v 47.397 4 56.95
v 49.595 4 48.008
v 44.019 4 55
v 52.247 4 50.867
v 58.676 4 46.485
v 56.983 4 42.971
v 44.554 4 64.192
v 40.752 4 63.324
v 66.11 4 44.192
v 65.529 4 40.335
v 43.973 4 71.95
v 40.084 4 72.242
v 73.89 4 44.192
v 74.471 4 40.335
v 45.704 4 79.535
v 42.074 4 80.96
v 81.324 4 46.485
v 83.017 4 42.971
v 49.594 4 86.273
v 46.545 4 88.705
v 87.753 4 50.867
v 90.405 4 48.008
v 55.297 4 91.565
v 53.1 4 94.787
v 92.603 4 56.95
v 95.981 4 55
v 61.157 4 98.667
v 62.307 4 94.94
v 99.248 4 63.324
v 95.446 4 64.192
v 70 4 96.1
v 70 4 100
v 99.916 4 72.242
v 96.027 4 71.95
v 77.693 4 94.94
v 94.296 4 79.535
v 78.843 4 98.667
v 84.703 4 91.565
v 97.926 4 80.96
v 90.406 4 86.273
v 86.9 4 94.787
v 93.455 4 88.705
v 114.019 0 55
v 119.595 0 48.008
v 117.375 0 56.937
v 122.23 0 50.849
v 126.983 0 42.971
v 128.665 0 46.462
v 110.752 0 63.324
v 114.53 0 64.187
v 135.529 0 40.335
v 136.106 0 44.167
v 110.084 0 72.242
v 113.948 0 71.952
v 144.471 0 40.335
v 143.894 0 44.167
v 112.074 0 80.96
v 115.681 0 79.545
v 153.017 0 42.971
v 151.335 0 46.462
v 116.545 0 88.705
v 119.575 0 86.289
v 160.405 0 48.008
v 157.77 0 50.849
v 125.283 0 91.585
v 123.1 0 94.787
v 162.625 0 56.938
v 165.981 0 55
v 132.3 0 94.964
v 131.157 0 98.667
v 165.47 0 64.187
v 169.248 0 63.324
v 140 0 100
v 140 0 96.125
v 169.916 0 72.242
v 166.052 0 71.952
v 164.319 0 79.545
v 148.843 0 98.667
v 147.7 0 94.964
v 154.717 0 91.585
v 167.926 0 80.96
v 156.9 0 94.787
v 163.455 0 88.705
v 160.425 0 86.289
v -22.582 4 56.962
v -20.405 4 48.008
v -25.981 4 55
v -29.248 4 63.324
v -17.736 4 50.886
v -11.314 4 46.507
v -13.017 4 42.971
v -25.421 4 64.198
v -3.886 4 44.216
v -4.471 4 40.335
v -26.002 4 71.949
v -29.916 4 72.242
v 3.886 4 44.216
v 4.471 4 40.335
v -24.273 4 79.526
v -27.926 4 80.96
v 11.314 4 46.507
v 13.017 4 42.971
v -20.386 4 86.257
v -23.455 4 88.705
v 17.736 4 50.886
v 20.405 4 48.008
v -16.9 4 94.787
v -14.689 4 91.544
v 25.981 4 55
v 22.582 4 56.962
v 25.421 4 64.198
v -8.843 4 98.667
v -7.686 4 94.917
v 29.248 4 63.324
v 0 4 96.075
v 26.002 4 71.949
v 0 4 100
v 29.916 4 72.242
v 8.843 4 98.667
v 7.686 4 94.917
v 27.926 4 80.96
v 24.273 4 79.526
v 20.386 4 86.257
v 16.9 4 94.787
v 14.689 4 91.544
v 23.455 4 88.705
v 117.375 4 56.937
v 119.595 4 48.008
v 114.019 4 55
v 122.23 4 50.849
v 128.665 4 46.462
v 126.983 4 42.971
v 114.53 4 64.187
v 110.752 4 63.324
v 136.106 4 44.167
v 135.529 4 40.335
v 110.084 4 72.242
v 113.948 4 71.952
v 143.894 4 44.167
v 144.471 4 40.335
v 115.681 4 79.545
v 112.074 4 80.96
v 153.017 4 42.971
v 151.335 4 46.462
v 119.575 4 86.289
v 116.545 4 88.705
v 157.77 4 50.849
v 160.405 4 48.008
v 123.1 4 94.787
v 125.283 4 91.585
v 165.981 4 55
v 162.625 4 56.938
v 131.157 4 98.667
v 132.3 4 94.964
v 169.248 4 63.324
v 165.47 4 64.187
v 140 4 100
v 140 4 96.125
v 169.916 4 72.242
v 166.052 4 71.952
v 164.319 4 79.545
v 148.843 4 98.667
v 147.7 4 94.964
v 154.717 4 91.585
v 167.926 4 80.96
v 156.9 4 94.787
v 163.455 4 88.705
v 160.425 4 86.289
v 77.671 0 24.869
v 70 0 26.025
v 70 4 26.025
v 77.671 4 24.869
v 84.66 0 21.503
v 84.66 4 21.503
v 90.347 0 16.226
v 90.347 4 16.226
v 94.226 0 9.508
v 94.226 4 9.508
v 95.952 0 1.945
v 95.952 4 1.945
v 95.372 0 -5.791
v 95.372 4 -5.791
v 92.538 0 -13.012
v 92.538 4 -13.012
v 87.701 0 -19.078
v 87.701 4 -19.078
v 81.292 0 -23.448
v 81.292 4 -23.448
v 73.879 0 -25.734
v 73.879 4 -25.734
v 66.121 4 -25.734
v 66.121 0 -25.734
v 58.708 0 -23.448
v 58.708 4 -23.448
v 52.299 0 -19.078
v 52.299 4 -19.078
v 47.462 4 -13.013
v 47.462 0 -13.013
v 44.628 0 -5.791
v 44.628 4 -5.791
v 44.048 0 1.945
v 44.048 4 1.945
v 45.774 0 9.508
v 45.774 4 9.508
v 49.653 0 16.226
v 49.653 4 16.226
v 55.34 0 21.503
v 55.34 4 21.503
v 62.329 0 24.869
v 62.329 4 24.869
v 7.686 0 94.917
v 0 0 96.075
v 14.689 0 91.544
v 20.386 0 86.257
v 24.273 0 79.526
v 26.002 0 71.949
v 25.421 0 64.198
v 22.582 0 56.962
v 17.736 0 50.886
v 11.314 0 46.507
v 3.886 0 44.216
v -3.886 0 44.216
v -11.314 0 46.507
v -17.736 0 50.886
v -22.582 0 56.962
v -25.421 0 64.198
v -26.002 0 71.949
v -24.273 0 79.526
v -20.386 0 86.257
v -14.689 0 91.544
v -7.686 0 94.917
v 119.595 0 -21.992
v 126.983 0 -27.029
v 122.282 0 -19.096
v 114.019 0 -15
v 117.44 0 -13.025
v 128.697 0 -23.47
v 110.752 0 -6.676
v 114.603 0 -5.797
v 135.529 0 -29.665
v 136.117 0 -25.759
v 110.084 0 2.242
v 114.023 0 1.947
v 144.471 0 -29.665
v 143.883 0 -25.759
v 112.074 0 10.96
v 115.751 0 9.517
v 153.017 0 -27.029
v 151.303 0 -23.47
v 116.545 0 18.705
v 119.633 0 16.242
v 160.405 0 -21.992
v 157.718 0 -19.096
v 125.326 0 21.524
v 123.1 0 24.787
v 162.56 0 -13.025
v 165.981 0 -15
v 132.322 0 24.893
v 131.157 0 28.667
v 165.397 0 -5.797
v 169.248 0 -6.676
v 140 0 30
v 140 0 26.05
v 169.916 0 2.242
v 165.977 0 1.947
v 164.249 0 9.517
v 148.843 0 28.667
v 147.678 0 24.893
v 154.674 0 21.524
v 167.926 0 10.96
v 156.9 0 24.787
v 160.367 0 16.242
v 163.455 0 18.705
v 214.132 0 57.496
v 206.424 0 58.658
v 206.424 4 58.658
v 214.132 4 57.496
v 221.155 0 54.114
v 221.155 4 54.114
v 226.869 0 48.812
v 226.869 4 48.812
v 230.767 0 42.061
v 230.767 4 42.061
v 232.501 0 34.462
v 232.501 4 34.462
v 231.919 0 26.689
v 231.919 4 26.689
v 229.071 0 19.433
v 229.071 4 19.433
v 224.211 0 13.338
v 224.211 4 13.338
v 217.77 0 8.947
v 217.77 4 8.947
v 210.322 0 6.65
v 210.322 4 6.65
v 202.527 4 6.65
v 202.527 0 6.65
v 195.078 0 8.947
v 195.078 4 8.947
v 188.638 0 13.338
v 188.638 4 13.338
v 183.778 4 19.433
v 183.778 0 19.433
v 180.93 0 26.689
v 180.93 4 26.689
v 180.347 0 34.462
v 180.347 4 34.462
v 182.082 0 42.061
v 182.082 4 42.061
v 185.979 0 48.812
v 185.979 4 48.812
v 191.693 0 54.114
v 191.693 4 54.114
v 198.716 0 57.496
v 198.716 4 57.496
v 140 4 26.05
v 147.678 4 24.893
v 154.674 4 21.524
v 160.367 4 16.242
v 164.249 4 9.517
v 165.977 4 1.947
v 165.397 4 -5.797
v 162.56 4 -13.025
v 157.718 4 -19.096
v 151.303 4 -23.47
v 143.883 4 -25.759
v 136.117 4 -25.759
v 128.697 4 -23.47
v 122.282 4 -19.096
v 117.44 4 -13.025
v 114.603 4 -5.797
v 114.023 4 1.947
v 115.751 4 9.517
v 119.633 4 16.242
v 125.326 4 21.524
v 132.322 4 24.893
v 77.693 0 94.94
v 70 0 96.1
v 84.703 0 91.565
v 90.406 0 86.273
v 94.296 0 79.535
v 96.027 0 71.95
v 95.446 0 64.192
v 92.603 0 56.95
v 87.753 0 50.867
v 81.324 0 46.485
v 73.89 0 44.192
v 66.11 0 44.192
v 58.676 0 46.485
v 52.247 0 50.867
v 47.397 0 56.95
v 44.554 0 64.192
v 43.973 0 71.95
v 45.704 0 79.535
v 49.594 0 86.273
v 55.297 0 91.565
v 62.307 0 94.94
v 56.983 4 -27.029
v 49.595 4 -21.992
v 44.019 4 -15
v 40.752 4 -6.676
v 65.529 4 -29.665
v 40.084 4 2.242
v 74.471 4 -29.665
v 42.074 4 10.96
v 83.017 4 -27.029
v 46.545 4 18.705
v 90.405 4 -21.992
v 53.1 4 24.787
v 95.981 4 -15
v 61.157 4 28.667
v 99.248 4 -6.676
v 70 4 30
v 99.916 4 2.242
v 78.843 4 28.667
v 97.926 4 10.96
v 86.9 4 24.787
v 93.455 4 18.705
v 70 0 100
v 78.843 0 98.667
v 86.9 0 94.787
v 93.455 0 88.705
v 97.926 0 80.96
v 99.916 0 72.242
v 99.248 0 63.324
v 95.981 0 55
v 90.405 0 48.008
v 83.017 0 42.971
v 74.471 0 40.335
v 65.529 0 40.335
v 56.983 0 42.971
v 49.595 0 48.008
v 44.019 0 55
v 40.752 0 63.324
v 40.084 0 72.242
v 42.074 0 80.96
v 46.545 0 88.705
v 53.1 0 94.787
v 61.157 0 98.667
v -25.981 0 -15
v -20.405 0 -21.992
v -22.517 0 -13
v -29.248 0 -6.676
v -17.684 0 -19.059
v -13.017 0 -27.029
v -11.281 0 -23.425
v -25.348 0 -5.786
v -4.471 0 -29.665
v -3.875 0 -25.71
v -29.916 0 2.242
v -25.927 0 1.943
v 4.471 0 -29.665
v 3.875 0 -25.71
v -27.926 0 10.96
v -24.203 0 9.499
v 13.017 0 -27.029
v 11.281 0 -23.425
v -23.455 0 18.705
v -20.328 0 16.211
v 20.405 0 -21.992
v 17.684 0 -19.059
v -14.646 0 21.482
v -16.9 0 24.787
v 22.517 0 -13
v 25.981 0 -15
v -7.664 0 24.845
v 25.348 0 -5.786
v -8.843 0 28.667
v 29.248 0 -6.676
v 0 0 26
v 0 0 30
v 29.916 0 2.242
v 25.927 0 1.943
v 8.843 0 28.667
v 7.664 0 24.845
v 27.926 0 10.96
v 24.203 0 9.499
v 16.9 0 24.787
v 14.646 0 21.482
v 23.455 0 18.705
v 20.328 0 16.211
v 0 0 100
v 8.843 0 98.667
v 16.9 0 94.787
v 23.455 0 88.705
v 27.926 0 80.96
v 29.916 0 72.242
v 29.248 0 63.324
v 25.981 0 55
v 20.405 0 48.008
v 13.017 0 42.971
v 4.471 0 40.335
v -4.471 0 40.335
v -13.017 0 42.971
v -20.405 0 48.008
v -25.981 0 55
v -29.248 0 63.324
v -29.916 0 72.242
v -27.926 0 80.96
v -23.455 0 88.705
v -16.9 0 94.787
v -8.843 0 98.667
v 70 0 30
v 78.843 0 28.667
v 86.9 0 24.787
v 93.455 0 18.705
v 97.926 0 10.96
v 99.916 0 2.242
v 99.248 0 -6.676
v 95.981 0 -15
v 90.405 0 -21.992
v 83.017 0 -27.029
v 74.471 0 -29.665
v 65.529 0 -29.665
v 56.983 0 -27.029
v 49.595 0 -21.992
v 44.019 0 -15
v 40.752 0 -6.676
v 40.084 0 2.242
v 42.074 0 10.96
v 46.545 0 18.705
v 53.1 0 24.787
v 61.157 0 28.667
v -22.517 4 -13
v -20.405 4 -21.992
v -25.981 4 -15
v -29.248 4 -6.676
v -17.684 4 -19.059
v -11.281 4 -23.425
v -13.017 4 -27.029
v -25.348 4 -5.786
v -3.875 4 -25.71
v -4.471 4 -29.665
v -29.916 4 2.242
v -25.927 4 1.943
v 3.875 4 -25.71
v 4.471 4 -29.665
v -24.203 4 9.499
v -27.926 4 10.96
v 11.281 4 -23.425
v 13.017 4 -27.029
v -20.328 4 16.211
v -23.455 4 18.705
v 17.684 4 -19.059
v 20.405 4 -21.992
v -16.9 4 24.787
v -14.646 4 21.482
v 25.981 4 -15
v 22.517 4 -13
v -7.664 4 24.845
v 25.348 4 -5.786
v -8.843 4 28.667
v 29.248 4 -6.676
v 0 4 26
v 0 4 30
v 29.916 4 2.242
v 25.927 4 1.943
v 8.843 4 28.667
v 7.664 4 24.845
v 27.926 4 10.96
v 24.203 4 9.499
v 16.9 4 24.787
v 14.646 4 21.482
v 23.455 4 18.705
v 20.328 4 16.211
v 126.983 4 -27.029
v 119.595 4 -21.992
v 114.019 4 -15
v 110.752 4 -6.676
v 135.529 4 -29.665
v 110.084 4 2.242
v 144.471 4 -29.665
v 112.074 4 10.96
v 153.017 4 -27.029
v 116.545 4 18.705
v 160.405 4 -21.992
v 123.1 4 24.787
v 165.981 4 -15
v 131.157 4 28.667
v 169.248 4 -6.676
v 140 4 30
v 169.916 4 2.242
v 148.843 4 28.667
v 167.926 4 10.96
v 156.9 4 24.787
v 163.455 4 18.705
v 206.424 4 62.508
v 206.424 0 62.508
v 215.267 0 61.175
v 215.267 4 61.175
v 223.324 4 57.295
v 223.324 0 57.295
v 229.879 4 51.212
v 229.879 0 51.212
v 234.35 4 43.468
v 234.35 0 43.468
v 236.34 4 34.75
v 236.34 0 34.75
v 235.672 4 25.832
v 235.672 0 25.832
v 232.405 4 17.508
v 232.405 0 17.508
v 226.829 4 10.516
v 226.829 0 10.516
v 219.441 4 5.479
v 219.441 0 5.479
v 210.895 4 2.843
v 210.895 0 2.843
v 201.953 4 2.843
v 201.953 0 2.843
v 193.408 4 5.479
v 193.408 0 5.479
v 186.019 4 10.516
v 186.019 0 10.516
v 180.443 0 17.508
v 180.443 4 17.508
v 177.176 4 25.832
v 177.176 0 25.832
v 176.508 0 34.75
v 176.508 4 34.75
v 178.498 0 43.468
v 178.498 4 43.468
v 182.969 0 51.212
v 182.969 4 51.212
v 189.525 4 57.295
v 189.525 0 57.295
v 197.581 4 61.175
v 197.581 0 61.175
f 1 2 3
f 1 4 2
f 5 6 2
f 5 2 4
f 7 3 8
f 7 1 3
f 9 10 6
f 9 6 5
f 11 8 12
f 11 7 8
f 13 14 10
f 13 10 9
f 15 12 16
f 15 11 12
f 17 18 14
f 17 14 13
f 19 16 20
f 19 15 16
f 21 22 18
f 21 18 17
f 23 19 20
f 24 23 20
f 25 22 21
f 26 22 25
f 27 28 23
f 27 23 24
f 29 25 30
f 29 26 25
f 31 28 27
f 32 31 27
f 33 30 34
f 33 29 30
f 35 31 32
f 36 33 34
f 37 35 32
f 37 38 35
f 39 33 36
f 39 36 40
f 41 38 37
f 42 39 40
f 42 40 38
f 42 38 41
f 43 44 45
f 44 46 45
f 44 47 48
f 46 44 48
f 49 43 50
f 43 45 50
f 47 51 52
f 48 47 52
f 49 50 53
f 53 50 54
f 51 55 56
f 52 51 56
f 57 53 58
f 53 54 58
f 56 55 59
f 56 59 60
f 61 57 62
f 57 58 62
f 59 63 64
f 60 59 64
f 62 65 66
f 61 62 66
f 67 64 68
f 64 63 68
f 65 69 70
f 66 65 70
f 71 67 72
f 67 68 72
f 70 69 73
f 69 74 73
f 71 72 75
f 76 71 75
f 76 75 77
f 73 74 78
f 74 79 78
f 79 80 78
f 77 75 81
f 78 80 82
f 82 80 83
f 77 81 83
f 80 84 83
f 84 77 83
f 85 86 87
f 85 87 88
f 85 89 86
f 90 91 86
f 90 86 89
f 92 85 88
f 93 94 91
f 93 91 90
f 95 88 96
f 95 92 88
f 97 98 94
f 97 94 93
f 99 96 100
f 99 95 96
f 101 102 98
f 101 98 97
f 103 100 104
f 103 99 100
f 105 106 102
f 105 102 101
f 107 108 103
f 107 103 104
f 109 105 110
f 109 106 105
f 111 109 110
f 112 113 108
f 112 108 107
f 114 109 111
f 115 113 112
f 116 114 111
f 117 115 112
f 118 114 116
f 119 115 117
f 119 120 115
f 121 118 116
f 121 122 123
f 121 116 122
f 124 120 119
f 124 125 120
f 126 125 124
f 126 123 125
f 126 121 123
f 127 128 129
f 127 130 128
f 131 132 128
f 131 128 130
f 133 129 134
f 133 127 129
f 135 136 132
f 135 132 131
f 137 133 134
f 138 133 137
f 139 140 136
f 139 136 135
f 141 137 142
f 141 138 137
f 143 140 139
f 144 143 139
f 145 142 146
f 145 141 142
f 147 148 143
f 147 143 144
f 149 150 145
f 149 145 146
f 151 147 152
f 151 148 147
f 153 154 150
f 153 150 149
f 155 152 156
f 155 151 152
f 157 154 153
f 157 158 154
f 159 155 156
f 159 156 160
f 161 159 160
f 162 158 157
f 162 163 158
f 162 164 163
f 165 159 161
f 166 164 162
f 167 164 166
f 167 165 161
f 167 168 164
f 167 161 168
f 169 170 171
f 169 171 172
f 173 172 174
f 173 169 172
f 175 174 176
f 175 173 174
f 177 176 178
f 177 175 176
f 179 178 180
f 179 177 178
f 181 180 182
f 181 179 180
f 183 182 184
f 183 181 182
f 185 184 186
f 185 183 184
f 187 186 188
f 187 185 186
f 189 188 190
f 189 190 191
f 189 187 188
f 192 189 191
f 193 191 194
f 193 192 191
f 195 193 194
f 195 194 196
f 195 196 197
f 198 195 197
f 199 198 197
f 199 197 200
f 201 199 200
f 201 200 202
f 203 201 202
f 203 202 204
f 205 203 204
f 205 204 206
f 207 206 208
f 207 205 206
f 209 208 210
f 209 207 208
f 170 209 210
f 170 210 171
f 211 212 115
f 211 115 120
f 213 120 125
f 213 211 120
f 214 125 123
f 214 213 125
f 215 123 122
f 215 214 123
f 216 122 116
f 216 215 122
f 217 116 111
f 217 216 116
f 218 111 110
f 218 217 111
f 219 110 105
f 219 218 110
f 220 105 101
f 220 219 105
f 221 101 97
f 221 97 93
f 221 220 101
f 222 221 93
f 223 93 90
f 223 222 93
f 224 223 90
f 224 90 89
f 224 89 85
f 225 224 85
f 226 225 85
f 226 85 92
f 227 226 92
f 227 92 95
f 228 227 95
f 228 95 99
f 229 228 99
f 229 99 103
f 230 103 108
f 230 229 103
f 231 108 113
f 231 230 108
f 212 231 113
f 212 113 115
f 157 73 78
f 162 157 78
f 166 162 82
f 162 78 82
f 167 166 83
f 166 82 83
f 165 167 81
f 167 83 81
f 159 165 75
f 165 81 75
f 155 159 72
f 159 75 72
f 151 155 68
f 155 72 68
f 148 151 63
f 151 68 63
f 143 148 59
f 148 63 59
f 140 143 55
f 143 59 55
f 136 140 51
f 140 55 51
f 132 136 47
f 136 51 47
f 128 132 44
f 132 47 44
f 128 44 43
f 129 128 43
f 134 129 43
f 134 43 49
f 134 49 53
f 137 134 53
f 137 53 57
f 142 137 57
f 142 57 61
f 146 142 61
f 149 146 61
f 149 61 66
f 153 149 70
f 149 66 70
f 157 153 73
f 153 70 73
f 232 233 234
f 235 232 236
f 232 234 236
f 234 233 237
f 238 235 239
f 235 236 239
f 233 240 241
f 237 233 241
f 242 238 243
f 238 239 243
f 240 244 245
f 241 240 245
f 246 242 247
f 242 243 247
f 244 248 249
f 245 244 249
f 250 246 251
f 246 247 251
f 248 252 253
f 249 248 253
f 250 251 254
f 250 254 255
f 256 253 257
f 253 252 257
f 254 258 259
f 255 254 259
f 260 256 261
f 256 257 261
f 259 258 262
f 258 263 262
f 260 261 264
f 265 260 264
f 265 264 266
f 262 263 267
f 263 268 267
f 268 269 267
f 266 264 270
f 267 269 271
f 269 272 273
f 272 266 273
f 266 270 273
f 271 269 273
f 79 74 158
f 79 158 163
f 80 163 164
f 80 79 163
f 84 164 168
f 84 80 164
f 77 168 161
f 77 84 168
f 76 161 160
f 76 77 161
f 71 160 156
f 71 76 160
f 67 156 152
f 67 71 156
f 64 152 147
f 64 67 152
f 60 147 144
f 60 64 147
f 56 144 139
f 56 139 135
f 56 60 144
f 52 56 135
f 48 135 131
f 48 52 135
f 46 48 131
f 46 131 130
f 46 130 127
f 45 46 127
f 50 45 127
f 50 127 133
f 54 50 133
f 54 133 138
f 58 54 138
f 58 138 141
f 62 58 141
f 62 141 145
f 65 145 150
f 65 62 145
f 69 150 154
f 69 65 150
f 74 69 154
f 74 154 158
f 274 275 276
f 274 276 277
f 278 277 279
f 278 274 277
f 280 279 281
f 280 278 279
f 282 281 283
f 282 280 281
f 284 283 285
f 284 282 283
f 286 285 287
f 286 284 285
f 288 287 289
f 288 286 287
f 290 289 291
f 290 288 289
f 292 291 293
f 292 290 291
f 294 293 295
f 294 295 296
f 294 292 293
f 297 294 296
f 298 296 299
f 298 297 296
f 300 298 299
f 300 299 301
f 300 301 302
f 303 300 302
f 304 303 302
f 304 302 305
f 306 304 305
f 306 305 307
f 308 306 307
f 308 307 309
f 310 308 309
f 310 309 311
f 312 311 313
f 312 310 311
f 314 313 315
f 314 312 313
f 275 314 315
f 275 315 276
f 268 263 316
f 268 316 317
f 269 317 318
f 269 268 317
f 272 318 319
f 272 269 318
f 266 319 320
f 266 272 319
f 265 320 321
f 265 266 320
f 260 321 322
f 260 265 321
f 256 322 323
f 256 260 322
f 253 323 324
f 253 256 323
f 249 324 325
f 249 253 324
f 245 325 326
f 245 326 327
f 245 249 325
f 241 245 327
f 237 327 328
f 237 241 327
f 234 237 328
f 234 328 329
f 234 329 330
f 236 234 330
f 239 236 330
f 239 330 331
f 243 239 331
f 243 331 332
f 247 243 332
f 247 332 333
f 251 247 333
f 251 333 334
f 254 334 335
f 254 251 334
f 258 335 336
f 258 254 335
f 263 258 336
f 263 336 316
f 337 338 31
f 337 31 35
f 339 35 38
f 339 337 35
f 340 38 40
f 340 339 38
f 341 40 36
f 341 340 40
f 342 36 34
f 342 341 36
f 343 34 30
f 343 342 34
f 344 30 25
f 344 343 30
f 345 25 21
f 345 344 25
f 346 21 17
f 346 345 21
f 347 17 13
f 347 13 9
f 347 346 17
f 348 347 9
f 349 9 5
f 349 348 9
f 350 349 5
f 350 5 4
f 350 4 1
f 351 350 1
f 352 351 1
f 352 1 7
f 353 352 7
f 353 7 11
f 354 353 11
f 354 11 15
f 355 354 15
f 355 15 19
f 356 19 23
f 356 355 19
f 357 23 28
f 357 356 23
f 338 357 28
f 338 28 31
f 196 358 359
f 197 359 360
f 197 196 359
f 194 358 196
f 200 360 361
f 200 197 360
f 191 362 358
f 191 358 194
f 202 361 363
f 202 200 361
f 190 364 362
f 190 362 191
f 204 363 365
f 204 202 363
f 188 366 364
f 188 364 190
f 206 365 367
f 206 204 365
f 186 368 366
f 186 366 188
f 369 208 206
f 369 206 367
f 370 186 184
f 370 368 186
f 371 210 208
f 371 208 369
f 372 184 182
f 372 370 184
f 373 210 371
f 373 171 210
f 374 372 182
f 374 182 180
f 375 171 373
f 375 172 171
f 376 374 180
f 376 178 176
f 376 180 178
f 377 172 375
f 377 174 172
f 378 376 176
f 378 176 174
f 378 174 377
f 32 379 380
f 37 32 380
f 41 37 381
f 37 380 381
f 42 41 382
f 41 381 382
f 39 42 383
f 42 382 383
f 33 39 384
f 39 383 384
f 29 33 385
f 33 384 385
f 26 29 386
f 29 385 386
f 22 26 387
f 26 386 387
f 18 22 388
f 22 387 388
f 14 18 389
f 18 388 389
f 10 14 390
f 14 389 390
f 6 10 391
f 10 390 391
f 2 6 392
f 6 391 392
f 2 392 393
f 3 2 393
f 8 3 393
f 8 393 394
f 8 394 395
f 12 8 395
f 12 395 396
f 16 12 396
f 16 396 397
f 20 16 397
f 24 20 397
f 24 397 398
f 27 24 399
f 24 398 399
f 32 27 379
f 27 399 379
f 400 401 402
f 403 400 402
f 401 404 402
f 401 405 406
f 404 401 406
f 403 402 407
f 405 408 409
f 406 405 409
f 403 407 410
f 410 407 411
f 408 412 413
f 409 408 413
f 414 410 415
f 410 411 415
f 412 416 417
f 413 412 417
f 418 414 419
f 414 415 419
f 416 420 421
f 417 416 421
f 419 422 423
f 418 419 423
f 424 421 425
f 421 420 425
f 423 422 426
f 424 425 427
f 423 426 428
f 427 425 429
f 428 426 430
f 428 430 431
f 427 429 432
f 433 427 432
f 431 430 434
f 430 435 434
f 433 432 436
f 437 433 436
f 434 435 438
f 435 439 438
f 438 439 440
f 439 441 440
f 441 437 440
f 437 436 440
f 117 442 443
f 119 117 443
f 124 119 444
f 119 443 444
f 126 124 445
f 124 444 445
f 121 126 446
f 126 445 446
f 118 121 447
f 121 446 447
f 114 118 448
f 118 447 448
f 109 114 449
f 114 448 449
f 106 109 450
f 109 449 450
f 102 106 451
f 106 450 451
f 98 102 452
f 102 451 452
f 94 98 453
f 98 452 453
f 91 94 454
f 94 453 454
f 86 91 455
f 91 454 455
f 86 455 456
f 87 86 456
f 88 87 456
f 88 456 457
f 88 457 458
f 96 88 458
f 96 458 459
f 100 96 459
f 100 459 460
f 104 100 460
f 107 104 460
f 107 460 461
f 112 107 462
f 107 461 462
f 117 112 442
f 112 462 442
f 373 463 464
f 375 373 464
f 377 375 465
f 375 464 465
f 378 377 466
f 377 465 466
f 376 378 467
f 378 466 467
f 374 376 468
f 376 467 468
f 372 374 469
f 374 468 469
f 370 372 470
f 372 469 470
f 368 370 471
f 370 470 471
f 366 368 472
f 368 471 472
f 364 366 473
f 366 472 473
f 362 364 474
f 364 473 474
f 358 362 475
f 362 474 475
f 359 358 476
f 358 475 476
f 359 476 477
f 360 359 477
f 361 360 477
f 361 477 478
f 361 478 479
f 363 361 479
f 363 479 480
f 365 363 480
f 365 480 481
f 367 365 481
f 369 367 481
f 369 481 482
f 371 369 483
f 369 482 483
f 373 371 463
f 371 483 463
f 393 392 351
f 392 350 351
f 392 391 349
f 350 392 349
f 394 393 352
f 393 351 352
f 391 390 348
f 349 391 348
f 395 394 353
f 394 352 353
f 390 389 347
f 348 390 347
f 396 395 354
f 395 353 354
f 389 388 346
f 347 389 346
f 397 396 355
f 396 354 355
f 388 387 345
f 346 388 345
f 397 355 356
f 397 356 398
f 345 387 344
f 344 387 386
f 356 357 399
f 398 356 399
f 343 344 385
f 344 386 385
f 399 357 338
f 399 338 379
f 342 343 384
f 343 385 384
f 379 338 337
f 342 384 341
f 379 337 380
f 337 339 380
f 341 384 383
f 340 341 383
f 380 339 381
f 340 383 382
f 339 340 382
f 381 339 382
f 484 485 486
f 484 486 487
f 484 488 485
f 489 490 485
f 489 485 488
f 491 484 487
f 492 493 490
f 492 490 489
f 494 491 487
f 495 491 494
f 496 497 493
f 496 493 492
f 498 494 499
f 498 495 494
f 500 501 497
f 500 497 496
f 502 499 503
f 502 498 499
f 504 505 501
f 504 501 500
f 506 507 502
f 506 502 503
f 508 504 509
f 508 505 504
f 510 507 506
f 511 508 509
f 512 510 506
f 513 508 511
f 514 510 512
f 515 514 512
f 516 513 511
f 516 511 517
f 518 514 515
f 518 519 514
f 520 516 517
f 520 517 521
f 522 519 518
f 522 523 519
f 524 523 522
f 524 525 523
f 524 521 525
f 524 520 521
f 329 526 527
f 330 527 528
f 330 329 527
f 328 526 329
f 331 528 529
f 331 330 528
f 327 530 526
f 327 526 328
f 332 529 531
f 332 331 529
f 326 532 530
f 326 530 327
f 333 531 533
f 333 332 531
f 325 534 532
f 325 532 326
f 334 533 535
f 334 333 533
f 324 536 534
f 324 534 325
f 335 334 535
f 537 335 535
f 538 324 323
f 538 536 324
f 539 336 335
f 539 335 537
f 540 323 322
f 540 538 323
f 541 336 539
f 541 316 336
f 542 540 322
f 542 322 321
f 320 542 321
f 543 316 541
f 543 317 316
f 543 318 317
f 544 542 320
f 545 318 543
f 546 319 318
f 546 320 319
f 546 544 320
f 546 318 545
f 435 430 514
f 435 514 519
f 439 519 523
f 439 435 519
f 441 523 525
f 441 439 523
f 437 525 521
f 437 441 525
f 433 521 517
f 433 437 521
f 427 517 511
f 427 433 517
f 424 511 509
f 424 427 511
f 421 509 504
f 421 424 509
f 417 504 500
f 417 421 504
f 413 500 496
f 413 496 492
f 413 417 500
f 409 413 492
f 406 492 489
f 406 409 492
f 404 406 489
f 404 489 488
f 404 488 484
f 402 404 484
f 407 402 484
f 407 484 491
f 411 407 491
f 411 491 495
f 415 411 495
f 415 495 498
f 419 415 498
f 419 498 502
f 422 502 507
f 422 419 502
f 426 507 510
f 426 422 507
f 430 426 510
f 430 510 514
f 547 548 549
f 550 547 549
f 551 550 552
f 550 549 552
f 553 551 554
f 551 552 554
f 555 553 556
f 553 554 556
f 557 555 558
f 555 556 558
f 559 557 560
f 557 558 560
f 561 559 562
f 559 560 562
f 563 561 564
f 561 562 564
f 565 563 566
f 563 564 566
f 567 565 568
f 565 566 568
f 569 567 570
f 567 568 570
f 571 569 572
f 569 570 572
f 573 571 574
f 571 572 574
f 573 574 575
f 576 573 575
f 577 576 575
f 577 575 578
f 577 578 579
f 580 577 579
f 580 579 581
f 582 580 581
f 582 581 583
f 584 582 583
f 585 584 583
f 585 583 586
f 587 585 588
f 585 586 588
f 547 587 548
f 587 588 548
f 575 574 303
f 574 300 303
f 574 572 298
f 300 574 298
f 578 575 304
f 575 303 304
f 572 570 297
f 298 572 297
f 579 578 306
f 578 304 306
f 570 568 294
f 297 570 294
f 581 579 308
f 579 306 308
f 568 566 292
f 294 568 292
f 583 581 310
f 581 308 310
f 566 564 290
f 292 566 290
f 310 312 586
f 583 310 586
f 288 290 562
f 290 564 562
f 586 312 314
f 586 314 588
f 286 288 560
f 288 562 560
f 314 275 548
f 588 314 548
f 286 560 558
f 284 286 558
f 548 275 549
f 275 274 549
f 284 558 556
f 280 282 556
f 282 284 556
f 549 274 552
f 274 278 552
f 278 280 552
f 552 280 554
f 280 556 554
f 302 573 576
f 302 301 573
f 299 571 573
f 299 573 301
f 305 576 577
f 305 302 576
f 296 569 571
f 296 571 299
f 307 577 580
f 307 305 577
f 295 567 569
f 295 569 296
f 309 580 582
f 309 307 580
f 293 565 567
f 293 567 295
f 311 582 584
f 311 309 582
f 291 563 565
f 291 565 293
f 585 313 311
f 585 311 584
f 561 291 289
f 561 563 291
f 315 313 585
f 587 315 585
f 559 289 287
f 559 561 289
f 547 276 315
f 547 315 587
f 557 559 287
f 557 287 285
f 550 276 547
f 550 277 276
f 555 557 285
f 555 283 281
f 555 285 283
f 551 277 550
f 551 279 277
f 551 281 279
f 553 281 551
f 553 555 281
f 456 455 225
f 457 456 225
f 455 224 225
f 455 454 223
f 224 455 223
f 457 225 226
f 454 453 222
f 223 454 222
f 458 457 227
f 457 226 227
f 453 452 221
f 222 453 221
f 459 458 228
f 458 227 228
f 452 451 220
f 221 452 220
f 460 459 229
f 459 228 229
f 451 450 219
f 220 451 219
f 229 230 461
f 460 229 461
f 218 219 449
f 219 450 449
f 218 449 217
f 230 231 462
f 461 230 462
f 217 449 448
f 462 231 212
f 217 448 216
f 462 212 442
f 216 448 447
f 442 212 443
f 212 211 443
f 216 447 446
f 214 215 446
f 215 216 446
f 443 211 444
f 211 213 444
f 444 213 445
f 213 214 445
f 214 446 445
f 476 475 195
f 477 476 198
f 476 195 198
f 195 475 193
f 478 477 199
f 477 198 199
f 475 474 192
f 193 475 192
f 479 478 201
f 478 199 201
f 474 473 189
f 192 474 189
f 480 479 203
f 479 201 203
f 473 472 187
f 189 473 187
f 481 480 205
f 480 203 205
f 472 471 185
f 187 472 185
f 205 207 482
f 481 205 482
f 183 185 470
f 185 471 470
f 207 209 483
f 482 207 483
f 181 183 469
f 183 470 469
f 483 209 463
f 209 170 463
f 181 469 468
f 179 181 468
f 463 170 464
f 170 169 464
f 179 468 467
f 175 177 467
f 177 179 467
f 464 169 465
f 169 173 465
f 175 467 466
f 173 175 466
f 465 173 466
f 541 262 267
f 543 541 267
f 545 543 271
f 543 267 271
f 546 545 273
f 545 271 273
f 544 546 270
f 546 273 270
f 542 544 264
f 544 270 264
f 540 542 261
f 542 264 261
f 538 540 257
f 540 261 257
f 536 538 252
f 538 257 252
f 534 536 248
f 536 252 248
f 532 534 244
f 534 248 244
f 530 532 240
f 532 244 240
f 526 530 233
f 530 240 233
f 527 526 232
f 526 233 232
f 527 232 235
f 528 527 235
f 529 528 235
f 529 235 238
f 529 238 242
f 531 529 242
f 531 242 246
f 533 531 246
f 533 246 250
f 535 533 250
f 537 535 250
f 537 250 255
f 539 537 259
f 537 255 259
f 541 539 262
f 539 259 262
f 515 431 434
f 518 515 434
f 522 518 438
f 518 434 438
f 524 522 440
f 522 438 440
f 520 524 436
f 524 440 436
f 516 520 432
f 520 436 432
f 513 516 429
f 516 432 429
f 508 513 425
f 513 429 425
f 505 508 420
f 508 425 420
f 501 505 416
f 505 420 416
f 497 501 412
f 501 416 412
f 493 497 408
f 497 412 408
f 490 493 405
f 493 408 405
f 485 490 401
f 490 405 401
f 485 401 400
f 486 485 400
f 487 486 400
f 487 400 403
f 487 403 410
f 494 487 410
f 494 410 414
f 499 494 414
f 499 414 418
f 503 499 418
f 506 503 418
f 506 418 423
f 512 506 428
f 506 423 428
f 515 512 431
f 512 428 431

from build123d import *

# Parameters (mm, degrees)
SKETCH1_R             = 30
SKETCH1_R_2           = 26
BOSS_EXTRUDE1_DEPTH   = 4
SKETCH1_R_3           = 26.025
BOSS_EXTRUDE1_2_DEPTH = 4
SKETCH1_R_4           = 26.05
BOSS_EXTRUDE1_3_DEPTH = 4
SKETCH1_R_5           = 26.1
BOSS_EXTRUDE1_4_DEPTH = 4
SKETCH1_R_6           = 26.125
BOSS_EXTRUDE1_5_DEPTH = 4
SKETCH1_R_7           = 26.075
BOSS_EXTRUDE1_6_DEPTH = 4
SKETCH1_R_8           = 26.15
BOSS_EXTRUDE1_7_DEPTH = 4


with BuildPart() as part:
    # Sketch1 → Boss-Extrude1 (new body)
    with BuildSketch(Plane(origin=(0, 0, 0), x_dir=(1, 0, 0), z_dir=(0, 1, 0))):
        with Locations(Location((0, 0, 0), (0, 0, 270))):
            Circle(SKETCH1_R)
        with Locations(Location((0, 0, 0), (0, 0, 270))):
            Circle(SKETCH1_R_2, mode=Mode.SUBTRACT)
    extrude(amount=BOSS_EXTRUDE1_DEPTH)


with BuildPart() as body_2:
    # Sketch1 → Boss-Extrude1 2 (new body)
    with BuildSketch(Plane(origin=(0, 0, 0), x_dir=(1, 0, 0), z_dir=(0, 1, 0))):
        with Locations(Location((70, 0, 0), (0, 0, 270))):
            Circle(SKETCH1_R)
        with Locations(Location((70, 0, 0), (0, 0, 270))):
            Circle(SKETCH1_R_3, mode=Mode.SUBTRACT)
    extrude(amount=BOSS_EXTRUDE1_2_DEPTH)


with BuildPart() as body_3:
    # Sketch1 → Boss-Extrude1 3 (new body)
    with BuildSketch(Plane(origin=(0, 0, 0), x_dir=(1, 0, 0), z_dir=(0, 1, 0))):
        with Locations(Location((140, 0, 0), (0, 0, 270))):
            Circle(SKETCH1_R)
        with Locations(Location((140, 0, 0), (0, 0, 270))):
            Circle(SKETCH1_R_4, mode=Mode.SUBTRACT)
    extrude(amount=BOSS_EXTRUDE1_3_DEPTH)


with BuildPart() as body_4:
    # Sketch1 → Boss-Extrude1 4 (new body)
    with BuildSketch(Plane(origin=(0, 0, 0), x_dir=(1, 0, 0), z_dir=(0, 1, 0))):
        with Locations(Location((70, -70, 0), (0, 0, 270))):
            Circle(SKETCH1_R)
        with Locations(Location((70, -70, 0), (0, 0, 270))):
            Circle(SKETCH1_R_5, mode=Mode.SUBTRACT)
    extrude(amount=BOSS_EXTRUDE1_4_DEPTH)


with BuildPart() as body_5:
    # Sketch1 → Boss-Extrude1 5 (new body)
    with BuildSketch(Plane(origin=(0, 0, 0), x_dir=(1, 0, 0), z_dir=(0, 1, 0))):
        with Locations(Location((140, -70, 0), (0, 0, 270))):
            Circle(SKETCH1_R)
        with Locations(Location((140, -70, 0), (0, 0, 270))):
            Circle(SKETCH1_R_6, mode=Mode.SUBTRACT)
    extrude(amount=BOSS_EXTRUDE1_5_DEPTH)


with BuildPart() as body_6:
    # Sketch1 → Boss-Extrude1 6 (new body)
    with BuildSketch(Plane(origin=(0, 0, 0), x_dir=(1, 0, 0), z_dir=(0, 1, 0))):
        with Locations(Location((0, -70, 0), (0, 0, 270))):
            Circle(SKETCH1_R)
        with Locations(Location((0, -70, 0), (0, 0, 270))):
            Circle(SKETCH1_R_7, mode=Mode.SUBTRACT)
    extrude(amount=BOSS_EXTRUDE1_6_DEPTH)


with BuildPart() as body_7:
    # Sketch1 → Boss-Extrude1 7 (new body)
    with BuildSketch(Plane(origin=(0, 0, 0), x_dir=(1, 0, 0), z_dir=(0, 1, 0))):
        with Locations(Location((206.424153942, -32.507740778, 0), (0, 0, 270))):
            Circle(SKETCH1_R)
        with Locations(Location((206.424153942, -32.507740778, 0), (0, 0, 270))):
            Circle(SKETCH1_R_8, mode=Mode.SUBTRACT)
    extrude(amount=BOSS_EXTRUDE1_7_DEPTH)


solid = Compound([part.part, body_2.part, body_3.part, body_4.part, body_5.part, body_6.part, body_7.part])
